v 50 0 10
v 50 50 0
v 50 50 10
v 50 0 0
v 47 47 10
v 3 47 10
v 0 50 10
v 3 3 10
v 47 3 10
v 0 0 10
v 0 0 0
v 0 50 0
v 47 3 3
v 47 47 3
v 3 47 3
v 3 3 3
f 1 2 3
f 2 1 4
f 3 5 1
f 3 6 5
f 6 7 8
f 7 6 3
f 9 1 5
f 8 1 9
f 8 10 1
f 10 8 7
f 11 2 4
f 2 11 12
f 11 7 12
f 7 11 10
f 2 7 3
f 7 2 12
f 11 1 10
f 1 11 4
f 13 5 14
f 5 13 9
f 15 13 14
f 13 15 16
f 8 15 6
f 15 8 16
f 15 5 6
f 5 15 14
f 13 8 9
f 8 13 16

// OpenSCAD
// Generated by HEIDI for job job_1787785172004_bf469094
// Product: 3D-Printable Model Preparation Package
// Request: Failure injection test
// Model type: box
// Generated: 2026-09-07T04:35:15.958Z
//
// This is a parameterized OpenSCAD model. You can adjust the
// parameters below to customize the dimensions before rendering.

// ─── Parameters ───
width = 50;       // X dimension in mm
height = 50;     // Y dimension in mm
depth = 10;       // Z dimension in mm
wall = 3;    // wall thickness in mm
$fn = 60;               // facet resolution

// Parametric hollow box
module parametric_box() {
    difference() {
        // Outer shell
        cube([width, height, depth]);
        // Inner cavity
        translate([wall, wall, wall])
            cube([width - wall * 2, height - wall * 2, depth - wall + 1]);
    }
}
parametric_box();
